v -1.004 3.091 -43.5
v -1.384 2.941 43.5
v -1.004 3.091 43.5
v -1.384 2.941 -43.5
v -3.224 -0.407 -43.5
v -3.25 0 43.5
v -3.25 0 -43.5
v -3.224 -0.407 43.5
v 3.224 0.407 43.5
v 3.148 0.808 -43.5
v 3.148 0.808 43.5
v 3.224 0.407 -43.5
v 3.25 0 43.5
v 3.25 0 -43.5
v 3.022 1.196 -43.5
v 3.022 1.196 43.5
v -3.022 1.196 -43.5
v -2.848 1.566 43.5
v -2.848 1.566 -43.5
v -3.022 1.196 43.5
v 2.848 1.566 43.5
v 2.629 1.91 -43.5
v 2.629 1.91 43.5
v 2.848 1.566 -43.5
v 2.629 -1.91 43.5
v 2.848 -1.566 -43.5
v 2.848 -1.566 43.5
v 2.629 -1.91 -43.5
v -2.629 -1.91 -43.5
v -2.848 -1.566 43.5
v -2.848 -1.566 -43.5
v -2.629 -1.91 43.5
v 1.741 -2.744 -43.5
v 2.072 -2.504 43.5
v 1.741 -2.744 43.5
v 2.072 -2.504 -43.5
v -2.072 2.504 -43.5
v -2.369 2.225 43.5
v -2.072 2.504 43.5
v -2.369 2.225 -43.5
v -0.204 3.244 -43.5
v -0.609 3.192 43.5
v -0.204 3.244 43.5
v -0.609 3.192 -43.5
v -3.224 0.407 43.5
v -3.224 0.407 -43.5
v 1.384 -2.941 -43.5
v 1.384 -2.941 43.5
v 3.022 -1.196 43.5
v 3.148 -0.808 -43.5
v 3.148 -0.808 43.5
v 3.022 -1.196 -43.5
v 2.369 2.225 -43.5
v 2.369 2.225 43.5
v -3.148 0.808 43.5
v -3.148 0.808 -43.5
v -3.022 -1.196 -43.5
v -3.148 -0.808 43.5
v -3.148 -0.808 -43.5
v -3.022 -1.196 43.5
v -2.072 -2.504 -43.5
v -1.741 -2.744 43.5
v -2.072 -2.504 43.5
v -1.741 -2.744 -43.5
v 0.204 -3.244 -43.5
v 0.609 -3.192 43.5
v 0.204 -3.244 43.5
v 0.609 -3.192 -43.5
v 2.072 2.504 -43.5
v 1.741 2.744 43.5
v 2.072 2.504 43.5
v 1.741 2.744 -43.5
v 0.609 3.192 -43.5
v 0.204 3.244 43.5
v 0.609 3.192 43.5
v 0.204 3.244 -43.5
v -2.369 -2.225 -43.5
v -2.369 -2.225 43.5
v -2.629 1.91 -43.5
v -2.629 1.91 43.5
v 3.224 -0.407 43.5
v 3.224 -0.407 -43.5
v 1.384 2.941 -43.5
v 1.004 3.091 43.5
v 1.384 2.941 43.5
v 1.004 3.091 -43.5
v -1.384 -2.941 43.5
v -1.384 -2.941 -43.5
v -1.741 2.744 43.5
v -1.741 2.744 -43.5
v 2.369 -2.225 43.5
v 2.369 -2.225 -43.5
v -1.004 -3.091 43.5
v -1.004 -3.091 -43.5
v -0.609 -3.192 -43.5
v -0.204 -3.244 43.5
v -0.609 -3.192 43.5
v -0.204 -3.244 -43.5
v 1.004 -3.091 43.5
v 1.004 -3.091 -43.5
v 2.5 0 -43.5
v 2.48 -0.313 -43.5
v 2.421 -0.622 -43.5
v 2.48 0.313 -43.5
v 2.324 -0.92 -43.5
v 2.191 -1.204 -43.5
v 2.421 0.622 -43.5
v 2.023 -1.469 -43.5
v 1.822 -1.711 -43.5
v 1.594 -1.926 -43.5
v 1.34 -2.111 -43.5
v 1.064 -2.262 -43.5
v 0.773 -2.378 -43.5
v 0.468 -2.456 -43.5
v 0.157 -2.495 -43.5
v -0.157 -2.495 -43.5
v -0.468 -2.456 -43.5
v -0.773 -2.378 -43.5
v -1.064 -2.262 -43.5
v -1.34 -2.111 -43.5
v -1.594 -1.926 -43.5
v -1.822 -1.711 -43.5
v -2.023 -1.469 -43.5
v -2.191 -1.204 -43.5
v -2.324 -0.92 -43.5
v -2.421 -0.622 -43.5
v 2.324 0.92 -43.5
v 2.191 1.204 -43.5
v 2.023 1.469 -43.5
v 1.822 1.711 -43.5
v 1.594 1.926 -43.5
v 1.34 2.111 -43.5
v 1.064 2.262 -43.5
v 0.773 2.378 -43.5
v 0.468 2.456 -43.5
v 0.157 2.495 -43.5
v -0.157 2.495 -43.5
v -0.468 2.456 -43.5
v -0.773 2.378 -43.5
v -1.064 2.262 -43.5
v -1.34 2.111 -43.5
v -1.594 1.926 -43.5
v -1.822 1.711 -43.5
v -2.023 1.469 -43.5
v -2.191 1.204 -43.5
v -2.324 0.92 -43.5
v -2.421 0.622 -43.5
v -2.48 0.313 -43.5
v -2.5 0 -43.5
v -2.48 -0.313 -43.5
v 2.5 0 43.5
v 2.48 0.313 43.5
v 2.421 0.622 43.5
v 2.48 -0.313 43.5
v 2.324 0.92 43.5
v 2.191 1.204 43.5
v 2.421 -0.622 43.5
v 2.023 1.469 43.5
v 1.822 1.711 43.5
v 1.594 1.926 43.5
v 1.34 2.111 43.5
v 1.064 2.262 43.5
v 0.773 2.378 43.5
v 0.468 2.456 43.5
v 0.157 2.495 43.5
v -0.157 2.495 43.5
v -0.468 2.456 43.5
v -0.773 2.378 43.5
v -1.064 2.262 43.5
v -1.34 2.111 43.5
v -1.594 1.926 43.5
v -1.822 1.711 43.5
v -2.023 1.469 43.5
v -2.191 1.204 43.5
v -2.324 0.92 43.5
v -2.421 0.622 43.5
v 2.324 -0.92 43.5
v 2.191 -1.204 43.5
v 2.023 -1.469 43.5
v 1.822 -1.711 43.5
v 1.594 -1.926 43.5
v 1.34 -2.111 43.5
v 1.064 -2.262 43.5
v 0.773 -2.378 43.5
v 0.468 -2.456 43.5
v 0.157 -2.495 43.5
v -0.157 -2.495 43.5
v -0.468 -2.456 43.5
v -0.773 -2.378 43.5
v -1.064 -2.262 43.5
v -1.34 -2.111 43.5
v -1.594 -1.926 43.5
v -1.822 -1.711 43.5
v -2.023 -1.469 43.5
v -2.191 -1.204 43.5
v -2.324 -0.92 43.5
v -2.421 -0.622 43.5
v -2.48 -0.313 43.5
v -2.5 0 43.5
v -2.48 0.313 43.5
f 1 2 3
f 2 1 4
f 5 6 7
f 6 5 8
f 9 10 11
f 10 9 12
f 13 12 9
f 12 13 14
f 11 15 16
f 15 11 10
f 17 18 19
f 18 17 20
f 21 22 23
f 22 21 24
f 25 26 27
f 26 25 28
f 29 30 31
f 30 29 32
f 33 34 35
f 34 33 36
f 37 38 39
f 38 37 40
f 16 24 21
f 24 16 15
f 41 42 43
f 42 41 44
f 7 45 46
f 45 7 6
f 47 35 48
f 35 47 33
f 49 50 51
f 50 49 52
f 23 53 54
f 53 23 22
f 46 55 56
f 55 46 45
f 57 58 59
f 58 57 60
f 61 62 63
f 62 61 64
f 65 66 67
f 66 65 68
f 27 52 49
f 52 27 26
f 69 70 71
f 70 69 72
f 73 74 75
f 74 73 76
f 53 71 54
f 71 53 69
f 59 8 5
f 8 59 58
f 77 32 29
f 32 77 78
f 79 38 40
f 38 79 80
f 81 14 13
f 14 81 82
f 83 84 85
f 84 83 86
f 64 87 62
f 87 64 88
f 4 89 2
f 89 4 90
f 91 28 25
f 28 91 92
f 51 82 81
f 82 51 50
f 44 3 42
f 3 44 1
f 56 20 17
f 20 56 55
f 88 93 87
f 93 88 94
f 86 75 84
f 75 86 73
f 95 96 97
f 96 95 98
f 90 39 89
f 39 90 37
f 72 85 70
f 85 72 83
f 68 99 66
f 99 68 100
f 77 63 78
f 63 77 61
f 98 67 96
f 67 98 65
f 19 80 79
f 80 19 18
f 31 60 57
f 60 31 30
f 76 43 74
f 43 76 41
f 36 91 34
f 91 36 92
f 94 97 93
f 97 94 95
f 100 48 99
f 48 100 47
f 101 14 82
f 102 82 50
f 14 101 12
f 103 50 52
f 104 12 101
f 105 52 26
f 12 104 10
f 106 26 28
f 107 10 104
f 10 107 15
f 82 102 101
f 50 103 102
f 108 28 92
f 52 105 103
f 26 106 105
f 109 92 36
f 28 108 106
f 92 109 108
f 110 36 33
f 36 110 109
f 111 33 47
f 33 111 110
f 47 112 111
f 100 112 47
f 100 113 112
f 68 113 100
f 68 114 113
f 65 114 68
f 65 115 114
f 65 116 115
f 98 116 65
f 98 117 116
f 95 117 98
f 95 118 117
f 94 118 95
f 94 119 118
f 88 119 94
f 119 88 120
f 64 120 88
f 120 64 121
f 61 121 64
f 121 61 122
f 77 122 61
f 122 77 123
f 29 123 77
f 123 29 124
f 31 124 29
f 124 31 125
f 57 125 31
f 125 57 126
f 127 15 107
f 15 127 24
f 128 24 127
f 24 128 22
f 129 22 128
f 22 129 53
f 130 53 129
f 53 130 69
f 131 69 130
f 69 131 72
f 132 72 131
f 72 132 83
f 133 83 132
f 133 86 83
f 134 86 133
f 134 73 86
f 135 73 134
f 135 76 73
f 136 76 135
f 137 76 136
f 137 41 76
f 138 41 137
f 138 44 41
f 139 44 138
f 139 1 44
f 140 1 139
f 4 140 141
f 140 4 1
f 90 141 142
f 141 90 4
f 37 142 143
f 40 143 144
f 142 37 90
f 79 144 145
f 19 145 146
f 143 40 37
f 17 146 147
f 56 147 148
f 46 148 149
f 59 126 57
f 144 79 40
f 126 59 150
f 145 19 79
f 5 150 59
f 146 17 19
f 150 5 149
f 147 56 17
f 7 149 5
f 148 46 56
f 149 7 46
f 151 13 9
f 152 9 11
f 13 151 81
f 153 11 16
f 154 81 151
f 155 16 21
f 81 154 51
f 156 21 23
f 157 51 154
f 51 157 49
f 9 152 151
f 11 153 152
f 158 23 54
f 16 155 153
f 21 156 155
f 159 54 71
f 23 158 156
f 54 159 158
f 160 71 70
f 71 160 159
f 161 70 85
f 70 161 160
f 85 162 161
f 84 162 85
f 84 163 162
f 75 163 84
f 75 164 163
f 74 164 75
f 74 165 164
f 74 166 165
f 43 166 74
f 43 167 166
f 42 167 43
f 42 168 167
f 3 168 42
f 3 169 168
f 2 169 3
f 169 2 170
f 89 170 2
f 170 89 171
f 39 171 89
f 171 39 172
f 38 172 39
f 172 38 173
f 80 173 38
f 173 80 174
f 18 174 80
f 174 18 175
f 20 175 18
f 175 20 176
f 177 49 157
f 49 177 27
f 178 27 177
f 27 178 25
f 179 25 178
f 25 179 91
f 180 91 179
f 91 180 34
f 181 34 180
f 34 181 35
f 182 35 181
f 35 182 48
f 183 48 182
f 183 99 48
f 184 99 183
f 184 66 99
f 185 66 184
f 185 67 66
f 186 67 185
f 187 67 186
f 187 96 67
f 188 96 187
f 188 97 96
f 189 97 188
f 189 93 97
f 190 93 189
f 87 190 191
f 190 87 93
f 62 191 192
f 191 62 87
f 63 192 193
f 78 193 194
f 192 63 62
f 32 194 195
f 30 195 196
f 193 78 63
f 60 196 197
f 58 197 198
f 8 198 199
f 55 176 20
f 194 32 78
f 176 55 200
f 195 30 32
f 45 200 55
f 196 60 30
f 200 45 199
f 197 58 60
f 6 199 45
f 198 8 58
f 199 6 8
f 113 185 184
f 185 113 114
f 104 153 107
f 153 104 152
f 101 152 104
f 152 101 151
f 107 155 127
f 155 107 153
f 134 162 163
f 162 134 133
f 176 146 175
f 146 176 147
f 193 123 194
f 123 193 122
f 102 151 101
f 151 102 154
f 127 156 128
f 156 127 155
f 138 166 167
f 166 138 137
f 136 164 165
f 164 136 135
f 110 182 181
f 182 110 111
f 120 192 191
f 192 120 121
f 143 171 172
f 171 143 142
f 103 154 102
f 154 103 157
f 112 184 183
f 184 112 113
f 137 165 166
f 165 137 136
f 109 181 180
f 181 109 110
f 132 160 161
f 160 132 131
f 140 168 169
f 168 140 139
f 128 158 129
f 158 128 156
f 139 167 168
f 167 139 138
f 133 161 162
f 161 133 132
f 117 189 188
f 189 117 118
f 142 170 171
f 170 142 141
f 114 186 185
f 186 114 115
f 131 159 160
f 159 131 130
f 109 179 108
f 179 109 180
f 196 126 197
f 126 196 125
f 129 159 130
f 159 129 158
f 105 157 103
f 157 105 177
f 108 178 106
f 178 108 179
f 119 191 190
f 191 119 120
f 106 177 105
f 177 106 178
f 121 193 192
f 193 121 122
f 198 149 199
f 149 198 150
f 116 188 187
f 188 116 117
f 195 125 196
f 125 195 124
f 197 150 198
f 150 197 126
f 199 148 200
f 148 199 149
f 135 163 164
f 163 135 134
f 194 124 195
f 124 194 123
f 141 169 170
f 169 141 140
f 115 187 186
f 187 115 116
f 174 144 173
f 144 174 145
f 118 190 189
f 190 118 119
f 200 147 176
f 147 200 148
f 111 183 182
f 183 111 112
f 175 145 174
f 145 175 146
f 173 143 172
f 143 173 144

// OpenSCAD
$fn = 50;


difference() {
	union() {
		translate(v = [0, 0, -43.5000000000]) {
			cylinder(h = 87, r = 3.2500000000);
		}
	}
	union() {
		translate(v = [0, 0, -100.0000000000]) {
			cylinder(h = 200, r = 2.5000000000);
		}
	}
}
